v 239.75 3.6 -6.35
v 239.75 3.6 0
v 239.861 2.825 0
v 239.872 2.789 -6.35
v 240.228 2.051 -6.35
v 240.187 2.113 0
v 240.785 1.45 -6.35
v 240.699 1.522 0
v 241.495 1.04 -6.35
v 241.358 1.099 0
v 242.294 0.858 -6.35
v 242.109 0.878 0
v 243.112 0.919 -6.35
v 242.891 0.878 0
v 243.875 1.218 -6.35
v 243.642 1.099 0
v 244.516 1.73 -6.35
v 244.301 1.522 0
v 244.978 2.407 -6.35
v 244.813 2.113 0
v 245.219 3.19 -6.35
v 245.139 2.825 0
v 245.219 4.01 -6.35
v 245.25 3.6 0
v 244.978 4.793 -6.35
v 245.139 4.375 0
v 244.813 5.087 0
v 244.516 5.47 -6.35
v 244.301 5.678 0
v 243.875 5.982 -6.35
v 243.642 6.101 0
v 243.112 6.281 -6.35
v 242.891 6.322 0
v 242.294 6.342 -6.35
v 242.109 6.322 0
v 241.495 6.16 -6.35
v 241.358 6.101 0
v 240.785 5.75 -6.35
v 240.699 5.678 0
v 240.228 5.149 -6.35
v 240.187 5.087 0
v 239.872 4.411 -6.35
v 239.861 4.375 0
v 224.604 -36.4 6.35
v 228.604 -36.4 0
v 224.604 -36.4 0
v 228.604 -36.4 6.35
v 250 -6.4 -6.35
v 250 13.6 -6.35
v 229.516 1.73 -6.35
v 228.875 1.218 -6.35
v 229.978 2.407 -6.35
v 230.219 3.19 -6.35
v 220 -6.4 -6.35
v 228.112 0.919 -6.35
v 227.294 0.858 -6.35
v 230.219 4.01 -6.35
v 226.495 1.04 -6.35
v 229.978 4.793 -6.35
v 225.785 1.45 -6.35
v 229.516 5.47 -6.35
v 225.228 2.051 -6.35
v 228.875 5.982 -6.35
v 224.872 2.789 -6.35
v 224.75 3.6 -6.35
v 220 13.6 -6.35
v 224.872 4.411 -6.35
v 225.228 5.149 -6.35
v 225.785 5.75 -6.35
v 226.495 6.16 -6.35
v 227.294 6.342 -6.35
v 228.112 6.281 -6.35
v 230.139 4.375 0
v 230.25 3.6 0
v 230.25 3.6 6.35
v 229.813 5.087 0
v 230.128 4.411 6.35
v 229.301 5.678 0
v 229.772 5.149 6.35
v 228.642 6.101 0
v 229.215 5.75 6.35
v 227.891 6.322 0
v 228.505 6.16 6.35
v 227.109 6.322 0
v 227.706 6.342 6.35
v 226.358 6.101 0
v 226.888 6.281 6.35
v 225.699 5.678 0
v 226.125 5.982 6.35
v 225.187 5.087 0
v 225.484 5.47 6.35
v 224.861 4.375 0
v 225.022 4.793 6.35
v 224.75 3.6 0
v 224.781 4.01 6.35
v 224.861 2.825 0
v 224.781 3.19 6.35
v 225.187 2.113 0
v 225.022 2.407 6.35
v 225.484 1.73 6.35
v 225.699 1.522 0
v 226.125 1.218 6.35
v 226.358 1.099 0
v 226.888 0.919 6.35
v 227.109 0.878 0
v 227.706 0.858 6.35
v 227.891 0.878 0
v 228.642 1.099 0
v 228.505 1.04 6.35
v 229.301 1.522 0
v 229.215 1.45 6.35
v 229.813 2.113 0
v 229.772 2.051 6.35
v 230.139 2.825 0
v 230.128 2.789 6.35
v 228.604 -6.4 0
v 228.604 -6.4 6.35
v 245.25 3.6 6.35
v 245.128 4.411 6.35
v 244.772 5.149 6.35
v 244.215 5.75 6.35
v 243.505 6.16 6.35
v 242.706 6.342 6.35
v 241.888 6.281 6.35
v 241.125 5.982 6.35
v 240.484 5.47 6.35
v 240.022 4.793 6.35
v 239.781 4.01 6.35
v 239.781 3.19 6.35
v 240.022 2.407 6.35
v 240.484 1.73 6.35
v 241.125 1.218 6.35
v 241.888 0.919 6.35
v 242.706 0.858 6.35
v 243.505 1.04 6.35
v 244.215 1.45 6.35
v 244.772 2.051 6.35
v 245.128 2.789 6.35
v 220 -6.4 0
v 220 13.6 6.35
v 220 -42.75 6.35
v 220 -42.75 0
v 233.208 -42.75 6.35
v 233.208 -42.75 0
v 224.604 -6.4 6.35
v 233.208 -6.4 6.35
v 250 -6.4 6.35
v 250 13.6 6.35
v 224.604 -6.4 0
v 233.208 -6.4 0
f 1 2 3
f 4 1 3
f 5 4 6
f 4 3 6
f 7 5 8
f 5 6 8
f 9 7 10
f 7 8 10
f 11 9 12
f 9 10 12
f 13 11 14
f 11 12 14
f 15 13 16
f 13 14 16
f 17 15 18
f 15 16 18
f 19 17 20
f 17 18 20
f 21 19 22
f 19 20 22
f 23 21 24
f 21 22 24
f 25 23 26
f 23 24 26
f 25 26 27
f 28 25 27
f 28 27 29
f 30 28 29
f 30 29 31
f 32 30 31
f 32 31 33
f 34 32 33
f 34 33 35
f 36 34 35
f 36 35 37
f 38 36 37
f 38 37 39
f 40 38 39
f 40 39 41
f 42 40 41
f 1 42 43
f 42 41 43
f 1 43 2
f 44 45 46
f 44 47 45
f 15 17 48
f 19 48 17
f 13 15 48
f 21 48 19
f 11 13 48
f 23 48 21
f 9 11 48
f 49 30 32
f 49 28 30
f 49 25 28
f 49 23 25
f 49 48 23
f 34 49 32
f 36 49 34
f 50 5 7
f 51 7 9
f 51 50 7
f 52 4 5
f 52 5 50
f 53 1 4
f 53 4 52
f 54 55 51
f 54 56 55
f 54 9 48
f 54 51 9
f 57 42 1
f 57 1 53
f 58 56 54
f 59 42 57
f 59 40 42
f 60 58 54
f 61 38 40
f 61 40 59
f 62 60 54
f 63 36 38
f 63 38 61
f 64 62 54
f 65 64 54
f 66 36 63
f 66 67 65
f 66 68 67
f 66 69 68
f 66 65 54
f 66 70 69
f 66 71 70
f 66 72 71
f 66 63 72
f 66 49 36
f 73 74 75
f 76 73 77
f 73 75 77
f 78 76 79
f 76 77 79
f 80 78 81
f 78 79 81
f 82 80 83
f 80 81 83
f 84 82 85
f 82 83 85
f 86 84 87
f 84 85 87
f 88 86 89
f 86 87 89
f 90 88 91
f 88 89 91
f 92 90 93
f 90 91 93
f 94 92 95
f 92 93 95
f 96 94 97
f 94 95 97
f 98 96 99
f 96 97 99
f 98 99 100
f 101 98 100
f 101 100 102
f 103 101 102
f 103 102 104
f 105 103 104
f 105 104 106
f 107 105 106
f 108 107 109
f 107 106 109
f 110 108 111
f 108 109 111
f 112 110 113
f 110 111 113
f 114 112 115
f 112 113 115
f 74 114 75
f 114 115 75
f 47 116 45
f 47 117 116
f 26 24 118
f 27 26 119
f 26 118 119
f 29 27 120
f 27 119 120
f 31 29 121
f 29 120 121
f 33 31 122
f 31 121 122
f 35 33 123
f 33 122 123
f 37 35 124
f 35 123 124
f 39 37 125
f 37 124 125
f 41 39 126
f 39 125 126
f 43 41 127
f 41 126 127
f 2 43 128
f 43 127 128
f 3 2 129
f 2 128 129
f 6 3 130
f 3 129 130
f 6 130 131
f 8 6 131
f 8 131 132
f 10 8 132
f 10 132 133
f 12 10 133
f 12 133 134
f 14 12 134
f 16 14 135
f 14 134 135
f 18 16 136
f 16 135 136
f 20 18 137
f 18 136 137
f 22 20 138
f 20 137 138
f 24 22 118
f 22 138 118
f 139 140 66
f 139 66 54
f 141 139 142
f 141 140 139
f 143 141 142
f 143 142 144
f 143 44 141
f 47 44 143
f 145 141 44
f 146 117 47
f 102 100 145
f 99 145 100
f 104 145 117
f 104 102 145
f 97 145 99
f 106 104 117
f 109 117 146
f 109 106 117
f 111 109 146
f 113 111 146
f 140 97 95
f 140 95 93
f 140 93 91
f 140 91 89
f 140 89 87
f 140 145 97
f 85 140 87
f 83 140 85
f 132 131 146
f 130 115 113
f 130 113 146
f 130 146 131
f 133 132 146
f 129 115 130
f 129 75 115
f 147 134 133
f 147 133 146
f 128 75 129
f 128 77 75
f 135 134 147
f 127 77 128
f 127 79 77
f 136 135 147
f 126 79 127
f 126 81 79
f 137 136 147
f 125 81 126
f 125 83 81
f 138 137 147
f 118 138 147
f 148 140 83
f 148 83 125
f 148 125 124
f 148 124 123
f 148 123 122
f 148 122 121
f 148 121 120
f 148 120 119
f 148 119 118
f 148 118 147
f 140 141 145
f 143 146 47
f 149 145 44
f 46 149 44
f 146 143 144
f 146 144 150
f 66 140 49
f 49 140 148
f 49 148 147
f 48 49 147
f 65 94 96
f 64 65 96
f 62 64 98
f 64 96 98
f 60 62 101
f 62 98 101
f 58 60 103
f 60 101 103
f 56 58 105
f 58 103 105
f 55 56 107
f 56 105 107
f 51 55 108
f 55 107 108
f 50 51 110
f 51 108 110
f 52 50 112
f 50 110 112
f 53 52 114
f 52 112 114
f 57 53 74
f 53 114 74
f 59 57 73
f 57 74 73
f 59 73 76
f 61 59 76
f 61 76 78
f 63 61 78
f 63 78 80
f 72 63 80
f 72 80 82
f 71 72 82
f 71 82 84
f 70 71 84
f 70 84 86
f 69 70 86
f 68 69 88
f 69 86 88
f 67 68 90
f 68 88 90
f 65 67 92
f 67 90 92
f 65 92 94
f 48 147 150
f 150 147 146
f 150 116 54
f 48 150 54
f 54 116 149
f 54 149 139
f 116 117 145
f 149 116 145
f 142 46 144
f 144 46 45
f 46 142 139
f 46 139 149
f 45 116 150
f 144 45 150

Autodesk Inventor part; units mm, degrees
ref_plane "YZ Plane" through (0, 0, 0) normal (1, 0, 0) x (0, 1, 0)
ref_plane "XZ Plane" through (0, 0, 0) normal (0, 1, 0) x (-1, 0, 0)
ref_plane "XY Plane" through (0, 0, 0) normal (0, 0, 1) x (1, 0, 0)
sketch "Sketch1" plane through (0, 0, 0) normal (0, 0, 1) x (1, 0, 0)
  line L0 (0, 12.35) -> (250, 12.35) projected
  line L1 (0, 12.35) -> (0, 7.2) projected
  line L2 (0, 7.2) -> (250, 7.2) projected
  line L3 (250, 12.35) -> (250, 7.2) projected
  line L4 (250, 13.6) -> (0, 13.6) projected
  line L5 (0, -6.4) -> (250, -6.4) projected
  line L6 (250, -5.15) -> (0, -5.15) projected
  line L7 (250, 0) -> (250, -5.15) projected
  line L8 (0, 0) -> (250, 0) projected
  line L9 (0, 0) -> (0, -5.15) projected
  line L10 (250, -6.4) -> (220, -6.4)
  line L11 (220, -6.4) -> (220, 13.6)
  line L12 (220, 13.6) -> (250, 13.6)
  line L13 (250, 13.6) -> (250, -6.4)
  dimension "d0" = 30
extrude "Extrusion1" add sketch "Sketch1" along normal blind 6.35 contours L11 L4 L13 L0 | L0 L3 L2 L11 | L2 L13 L8 L11 | L8 L7 L6 L11 | L6 L13 L5 L11
sketch "Sketch2" plane through (0, 0, 6.35) normal (0, 0, 1) x (1, 0, 0)
  line L0 (250, 13.6) -> (220, 13.6) projected
  line L1 (220, -6.4) -> (250, -6.4) projected
  line L2 (220, 13.6) -> (250, -6.4)
  line L3 (235, 3.6) -> (250, 3.6)
  line L4 (250, -6.4) -> (250, 13.6) projected
  line L5 (235, 3.6) -> (220, 3.6)
  circle A0 centre (227.5, 3.6) radius 2.75
  circle A1 centre (242.5, 3.6) radius 2.75
  point P0 (0, 0)
  dimension "d3" = 5.5
extrude "Extrusion2" cut sketch "Sketch2" against normal blind 6.35 contours A0 L5 | L5 A0 | A1 L3 | L3 A1
sketch "Sketch3" plane through (0, 0, 6.35) normal (0, 0, 1) x (1, 0, 0)
  line L0 (220, -6.4) -> (220, 13.6) projected
  line L1 (220, -6.4) -> (224.604, -6.4)
  line L2 (224.604, -6.4) -> (224.604, -36.4)
  line L3 (224.604, -36.4) -> (220, -36.4)
  line L4 (220, -36.4) -> (220, -6.4)
  line L5 (250, -6.4) -> (220, -6.4) projected
  line L6 (233.2079, -6.4) -> (228.604, -6.4)
  line L7 (228.604, -6.4) -> (228.604, -36.4)
  line L8 (228.604, -36.4) -> (233.2079, -36.4)
  line L9 (233.2079, -36.4) -> (233.2079, -6.4)
  point P0 (0, 0)
  dimension "d6" = 30
  dimension "d7" = 4
extrude "Extrusion3" add sketch "Sketch3" against normal blind 6.35
sketch "Sketch4" plane through (0, 0, 6.35) normal (0, 0, 1) x (1, 0, 0)
  line L0 (233.2079, -6.4) -> (233.2079, -36.4) projected
  line L1 (233.2079, -36.4) -> (220, -36.4)
  line L2 (220, -36.4) -> (220, -42.75)
  line L3 (220, -42.75) -> (233.2079, -42.75)
  line L4 (233.2079, -42.75) -> (233.2079, -36.4)
  point P0 (0, 0)
  dimension "d10" = 6.35
extrude "Extrusion4" add sketch "Sketch4" against normal blind 6.35
sketch "Sketch5" plane through (0, 0, 0) normal (0, 0, -1) x (-1, 0, 0)
  line L0 (-228.604, -36.4) -> (-228.604, -6.4) projected
  line L1 (-228.604, -6.4) -> (-224.604, -6.4) projected
  line L2 (-224.604, -6.4) -> (-224.604, -36.4) projected
  line L3 (-224.604, -36.4) -> (-228.604, -36.4) projected
  circle A0 centre (-242.5, 3.6) radius 2.75 projected
  circle A1 centre (-227.5, 3.6) radius 2.75 projected
  line L4 (-233.2079, -6.4) -> (-233.2079, -42.75) projected
  line L5 (-233.2079, -42.75) -> (-220, -42.75) projected
  line L6 (-220, -42.75) -> (-220, 13.6) projected
  line L7 (-220, 13.6) -> (-250, 13.6) projected
  line L8 (-250, 13.6) -> (-250, -6.4) projected
  line L9 (-250, -6.4) -> (-233.2079, -6.4) projected
  line L10 (-233.2079, -6.4) -> (-233.2079, -42.75) projected
  line L11 (-233.2079, -6.4) -> (-220, -6.4)
  point P0 (0, 0)
extrude "Extrusion5" add sketch "Sketch5" along normal blind 6.35 contours L11 L9 L8 L7 L6 L1
properties part number "limitHolder"
